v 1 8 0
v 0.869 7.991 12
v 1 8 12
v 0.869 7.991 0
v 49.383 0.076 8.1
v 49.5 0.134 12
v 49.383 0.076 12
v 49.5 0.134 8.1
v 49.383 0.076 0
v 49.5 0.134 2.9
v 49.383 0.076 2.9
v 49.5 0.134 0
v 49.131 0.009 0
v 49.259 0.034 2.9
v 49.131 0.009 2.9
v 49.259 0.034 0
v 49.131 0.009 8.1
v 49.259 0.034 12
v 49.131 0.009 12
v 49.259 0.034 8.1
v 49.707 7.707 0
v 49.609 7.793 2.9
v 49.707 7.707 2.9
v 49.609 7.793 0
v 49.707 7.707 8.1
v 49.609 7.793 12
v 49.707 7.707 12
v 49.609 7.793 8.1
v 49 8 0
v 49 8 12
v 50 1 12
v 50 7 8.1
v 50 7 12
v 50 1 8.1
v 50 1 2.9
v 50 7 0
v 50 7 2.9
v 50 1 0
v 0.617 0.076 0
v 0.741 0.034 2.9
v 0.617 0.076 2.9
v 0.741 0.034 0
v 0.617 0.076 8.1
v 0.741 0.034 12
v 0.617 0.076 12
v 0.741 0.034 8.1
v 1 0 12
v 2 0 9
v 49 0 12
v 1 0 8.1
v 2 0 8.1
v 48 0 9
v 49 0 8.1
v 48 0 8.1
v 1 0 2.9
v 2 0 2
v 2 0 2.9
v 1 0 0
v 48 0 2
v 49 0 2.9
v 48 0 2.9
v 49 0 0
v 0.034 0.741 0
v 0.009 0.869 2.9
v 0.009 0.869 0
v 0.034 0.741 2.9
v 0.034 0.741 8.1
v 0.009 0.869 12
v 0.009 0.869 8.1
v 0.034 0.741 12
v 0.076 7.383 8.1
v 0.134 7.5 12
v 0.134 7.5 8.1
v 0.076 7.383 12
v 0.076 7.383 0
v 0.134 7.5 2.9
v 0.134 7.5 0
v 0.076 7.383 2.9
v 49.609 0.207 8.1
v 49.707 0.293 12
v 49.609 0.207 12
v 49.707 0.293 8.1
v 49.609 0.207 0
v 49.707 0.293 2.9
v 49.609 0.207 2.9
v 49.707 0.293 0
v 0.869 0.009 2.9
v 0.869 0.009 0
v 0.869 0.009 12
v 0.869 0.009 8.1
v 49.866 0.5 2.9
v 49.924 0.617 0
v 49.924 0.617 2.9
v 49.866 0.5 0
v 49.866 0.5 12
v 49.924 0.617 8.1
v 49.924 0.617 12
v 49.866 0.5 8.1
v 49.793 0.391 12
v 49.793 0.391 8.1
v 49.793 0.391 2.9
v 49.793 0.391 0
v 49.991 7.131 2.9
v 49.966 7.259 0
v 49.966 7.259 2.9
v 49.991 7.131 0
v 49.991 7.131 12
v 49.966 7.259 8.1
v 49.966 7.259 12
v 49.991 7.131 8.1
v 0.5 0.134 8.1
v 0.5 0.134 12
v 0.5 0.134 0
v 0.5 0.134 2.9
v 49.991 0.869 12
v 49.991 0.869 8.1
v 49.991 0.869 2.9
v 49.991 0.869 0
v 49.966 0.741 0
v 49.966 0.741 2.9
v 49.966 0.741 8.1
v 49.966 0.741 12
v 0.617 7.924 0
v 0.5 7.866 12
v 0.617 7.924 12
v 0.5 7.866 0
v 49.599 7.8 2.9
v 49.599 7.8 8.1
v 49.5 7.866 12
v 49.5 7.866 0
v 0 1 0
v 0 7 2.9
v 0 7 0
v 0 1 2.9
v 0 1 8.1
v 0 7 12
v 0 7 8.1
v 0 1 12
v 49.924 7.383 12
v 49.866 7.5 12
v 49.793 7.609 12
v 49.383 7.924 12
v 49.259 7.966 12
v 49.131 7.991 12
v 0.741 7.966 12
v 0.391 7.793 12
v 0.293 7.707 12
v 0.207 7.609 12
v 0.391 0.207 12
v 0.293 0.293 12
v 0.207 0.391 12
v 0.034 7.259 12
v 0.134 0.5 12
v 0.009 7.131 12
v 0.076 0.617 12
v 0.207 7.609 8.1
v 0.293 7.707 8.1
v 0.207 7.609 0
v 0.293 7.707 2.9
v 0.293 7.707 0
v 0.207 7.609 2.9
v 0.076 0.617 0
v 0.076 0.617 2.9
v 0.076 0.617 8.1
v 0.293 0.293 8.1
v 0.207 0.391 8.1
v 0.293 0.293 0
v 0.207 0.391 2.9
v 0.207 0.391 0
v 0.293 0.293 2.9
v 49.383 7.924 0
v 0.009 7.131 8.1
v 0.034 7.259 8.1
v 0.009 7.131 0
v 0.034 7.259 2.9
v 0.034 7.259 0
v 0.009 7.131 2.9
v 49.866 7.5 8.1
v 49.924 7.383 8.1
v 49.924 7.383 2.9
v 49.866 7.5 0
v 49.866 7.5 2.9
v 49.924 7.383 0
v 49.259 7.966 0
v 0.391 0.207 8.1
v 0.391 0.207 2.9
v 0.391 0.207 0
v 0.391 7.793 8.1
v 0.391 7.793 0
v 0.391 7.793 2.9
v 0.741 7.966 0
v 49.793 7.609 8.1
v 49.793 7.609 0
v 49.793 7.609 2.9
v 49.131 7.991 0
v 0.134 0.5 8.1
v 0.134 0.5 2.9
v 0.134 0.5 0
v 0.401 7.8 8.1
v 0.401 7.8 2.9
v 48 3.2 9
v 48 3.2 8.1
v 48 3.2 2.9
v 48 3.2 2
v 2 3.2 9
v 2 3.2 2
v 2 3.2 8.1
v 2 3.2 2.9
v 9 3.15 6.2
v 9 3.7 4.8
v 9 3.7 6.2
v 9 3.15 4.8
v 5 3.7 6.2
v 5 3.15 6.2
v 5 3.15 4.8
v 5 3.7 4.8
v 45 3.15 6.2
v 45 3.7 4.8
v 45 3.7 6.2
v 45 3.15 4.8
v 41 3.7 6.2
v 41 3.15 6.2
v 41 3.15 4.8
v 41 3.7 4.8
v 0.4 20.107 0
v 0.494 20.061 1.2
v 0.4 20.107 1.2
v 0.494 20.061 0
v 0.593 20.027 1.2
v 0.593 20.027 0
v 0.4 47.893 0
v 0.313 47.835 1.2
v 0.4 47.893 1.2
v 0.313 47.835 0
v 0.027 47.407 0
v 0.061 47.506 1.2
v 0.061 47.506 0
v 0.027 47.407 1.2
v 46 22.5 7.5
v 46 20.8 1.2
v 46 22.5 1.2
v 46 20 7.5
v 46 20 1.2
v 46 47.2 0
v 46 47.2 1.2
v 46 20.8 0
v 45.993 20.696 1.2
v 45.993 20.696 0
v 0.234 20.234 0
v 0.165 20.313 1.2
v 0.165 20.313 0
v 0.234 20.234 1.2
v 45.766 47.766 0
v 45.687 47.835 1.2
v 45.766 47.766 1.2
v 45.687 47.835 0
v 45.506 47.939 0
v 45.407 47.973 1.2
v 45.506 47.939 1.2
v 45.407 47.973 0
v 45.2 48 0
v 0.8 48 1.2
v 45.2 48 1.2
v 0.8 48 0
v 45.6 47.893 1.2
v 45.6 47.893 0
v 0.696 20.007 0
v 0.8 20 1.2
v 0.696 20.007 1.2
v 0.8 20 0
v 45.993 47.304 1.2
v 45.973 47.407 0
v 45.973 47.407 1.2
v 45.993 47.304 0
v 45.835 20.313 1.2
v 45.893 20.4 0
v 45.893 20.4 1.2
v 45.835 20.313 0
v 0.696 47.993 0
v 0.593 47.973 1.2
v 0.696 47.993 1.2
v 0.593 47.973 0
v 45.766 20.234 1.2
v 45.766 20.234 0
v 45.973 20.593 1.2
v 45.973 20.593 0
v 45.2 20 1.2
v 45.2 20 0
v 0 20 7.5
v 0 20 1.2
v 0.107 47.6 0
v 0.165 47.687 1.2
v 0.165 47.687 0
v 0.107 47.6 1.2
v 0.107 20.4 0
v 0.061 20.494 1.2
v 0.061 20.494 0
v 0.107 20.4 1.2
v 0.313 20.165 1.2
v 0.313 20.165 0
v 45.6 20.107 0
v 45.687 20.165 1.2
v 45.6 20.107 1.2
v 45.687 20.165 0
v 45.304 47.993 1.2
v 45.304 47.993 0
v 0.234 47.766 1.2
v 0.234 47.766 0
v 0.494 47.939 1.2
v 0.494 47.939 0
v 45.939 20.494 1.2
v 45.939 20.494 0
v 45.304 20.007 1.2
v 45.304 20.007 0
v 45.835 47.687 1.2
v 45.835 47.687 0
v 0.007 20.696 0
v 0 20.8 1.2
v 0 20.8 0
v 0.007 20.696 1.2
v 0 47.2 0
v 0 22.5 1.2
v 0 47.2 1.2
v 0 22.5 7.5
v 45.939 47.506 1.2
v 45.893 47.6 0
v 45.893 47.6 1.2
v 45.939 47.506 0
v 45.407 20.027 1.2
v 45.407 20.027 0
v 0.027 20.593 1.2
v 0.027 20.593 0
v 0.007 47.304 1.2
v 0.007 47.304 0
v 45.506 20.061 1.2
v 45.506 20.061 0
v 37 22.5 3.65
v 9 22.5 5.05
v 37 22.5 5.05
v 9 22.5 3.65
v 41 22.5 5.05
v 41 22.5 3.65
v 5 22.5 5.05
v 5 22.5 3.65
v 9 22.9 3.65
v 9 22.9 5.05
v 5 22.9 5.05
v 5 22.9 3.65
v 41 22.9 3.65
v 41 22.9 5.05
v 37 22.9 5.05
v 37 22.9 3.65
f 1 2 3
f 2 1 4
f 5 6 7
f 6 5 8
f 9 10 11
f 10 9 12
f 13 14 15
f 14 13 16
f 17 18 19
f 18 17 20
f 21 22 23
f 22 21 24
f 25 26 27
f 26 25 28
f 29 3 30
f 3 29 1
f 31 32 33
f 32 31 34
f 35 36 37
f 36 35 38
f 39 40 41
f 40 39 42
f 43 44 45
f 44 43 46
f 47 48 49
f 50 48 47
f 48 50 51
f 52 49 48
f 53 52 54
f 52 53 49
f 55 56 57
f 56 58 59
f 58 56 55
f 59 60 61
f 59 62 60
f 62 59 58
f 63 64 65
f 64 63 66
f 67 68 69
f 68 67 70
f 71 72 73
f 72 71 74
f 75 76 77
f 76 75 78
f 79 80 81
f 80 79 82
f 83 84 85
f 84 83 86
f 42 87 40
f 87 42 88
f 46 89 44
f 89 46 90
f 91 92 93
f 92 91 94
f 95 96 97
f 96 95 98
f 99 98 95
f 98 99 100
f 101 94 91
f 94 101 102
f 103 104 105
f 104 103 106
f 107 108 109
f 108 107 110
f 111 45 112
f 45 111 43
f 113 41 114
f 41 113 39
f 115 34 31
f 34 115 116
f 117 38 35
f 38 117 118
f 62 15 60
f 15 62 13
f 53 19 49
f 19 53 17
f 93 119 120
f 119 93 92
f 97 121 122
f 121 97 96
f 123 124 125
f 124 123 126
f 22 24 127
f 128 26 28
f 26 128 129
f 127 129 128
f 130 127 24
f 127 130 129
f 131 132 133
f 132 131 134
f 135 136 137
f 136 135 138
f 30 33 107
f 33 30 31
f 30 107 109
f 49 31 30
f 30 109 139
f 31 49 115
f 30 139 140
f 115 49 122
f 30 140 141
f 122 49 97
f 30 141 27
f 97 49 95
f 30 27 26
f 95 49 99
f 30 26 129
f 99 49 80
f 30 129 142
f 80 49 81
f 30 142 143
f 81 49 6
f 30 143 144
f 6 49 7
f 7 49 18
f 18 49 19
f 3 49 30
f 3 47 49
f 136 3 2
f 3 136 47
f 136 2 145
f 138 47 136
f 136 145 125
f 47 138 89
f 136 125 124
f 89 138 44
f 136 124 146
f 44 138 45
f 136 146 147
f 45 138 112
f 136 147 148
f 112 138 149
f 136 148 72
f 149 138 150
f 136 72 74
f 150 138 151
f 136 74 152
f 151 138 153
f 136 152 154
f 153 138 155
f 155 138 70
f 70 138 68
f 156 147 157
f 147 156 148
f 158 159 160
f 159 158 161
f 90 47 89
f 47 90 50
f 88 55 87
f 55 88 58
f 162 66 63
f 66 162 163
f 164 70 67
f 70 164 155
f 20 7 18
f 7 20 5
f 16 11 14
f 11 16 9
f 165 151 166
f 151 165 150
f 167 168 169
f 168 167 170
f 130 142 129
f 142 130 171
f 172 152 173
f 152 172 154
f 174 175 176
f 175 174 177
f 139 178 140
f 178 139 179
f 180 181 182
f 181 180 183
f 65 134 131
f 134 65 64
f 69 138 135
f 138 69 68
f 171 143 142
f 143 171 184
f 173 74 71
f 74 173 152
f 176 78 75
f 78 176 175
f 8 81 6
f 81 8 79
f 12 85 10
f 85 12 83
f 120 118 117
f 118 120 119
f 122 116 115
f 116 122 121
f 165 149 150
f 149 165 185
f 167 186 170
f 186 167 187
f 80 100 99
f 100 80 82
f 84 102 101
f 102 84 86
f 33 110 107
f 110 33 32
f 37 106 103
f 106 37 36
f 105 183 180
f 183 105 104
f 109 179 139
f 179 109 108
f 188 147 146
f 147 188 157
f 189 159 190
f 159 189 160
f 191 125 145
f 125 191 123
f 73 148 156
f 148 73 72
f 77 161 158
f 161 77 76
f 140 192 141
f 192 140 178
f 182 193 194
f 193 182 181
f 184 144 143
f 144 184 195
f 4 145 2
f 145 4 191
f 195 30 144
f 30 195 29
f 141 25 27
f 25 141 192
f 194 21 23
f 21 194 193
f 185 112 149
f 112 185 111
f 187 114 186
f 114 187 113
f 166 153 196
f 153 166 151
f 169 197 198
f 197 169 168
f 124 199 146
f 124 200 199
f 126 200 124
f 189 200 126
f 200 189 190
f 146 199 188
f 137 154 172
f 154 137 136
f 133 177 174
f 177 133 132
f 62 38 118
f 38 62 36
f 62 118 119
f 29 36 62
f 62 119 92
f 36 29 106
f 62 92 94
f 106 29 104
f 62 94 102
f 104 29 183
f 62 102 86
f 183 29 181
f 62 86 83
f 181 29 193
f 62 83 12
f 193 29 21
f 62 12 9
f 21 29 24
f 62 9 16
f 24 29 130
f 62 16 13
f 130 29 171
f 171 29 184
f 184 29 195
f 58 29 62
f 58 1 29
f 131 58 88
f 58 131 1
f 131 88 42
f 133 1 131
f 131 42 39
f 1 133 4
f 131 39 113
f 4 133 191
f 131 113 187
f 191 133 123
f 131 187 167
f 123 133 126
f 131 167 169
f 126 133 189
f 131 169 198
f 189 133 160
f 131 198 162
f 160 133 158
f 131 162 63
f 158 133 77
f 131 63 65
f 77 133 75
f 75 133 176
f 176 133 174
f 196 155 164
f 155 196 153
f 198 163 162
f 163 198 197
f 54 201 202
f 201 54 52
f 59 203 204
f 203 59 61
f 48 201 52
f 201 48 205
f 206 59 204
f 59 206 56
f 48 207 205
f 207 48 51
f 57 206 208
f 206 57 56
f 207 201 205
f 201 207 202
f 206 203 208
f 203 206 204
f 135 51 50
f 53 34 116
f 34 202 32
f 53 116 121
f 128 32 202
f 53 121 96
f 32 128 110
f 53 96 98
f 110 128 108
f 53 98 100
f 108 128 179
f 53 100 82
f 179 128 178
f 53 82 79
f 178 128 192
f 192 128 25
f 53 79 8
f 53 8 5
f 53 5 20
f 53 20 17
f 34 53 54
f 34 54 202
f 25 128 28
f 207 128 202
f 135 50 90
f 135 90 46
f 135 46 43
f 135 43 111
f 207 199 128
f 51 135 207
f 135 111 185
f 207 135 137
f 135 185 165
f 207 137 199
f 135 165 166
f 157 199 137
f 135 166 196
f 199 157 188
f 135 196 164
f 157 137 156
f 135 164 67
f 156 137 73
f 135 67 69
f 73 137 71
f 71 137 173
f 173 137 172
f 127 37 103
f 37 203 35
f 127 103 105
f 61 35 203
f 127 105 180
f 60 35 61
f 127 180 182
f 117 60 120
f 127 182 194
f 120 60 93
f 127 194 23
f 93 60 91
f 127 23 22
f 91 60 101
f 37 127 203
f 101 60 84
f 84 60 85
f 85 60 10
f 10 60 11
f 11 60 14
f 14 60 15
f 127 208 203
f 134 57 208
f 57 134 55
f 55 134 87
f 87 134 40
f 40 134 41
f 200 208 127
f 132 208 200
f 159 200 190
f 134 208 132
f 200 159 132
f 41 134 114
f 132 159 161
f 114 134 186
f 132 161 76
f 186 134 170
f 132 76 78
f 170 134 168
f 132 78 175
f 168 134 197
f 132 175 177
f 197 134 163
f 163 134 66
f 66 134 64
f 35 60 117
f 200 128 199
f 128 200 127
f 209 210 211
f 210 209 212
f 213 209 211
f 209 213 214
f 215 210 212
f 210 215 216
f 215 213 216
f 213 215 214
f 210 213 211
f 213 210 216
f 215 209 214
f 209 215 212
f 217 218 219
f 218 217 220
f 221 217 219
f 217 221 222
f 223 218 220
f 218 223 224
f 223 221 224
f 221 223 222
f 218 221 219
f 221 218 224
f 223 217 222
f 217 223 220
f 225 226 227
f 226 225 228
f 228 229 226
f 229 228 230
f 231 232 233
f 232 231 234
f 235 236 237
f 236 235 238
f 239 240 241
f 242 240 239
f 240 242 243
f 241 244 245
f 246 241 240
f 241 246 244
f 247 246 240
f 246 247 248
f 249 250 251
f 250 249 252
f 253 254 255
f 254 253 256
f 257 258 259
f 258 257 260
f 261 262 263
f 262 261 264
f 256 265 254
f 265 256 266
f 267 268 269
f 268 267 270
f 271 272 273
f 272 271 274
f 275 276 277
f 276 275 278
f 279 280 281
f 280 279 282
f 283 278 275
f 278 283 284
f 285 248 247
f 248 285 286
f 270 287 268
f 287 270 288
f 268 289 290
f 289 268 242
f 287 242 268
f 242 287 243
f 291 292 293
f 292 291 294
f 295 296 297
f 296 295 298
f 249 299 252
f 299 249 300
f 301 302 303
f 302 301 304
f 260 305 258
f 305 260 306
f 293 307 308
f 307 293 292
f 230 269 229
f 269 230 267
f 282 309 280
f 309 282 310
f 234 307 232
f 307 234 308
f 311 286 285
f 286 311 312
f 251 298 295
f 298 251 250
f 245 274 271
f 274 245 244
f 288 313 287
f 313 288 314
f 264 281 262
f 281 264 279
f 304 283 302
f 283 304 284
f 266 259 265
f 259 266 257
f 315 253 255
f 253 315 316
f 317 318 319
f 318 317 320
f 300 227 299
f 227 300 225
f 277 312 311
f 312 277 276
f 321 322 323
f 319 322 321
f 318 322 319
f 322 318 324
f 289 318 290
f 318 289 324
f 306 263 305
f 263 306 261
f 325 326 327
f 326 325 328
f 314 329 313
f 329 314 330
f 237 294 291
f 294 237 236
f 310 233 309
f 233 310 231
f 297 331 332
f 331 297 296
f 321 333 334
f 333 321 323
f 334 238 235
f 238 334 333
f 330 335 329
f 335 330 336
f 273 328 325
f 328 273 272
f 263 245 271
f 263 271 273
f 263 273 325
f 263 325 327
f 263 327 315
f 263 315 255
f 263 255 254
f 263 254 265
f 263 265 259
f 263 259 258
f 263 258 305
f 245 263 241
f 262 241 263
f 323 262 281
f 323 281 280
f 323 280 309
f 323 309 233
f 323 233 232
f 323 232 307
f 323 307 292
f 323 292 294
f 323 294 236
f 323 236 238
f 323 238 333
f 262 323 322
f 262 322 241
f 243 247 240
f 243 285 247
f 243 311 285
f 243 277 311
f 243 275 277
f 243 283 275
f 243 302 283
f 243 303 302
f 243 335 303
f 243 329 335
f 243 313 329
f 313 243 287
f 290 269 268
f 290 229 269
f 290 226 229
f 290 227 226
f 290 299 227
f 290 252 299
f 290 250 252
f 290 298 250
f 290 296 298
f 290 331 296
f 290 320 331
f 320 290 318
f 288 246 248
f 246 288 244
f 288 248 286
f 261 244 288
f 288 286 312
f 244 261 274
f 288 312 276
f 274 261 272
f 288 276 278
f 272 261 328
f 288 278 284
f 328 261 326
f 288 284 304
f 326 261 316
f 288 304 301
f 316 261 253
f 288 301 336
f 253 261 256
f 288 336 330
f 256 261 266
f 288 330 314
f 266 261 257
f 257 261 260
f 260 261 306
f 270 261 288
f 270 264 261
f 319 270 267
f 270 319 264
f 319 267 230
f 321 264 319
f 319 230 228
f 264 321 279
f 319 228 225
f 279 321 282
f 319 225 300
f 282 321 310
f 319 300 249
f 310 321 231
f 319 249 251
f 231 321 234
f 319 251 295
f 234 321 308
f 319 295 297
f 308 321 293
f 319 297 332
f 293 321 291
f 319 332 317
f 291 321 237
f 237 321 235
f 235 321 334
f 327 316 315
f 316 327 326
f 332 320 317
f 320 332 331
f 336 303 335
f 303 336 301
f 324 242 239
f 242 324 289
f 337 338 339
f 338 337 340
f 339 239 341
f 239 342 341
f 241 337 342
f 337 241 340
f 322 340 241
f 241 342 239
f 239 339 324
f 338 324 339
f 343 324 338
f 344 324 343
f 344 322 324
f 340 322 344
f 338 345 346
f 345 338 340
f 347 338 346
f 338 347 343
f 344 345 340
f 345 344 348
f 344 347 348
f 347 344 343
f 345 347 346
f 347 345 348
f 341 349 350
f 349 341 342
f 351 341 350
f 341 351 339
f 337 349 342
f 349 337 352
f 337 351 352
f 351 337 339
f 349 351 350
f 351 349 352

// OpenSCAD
/*
Small-scale snap-fit binder + page experiment.

Concept:
  - The binder is a short rail with a C-shaped side groove.
  - The page is a thin strip with a spine bead that slides into the groove.
  - Small top/bottom detents on the page bead create removable locking.

Part selector:
  part_id = 0; // preview both parts
  part_id = 1; // binder rail
  part_id = 2; // page strip
*/

$fn = 48;

part_id = 0;

clearance = 0.35;
rail_length = 50;
rail_height = 12;
rail_depth = 8;
wall = 2.0;

groove_width = 3.2;
groove_height = 7.0;
lip = 0.9;

page_length = 46;
page_width = 28;
page_thickness = 1.2;
spine_width = groove_width - 2 * clearance;
spine_height = groove_height - 2 * clearance;
detent_height = 0.45;
detent_length = 4.0;

module rounded_plate(size, r = 0.9) {
    hull() {
        for (x = [r, size[0] - r])
        for (y = [r, size[1] - r])
            translate([x, y, 0]) cylinder(h = size[2], r = r);
    }
}

module binder() {
    difference() {
        rounded_plate([rail_length, rail_depth, rail_height], 1.0);

        // Main channel.
        translate([wall, -0.1, wall])
            cube([rail_length - 2 * wall, groove_width + 0.1, groove_height]);

        // Front slot, leaving top/bottom lips to capture the page spine.
        translate([wall, -0.2, wall + lip])
            cube([rail_length - 2 * wall, rail_depth, groove_height - 2 * lip]);

        // Entry chamfers at both ends so the page starts more easily.
        translate([-0.1, -0.2, wall + lip])
            cube([2.2, rail_depth, groove_height - 2 * lip]);
        translate([rail_length - 2.1, -0.2, wall + lip])
            cube([2.2, rail_depth, groove_height - 2 * lip]);
    }

    // End-stop bumps inside the rail; these are intentionally small.
    translate([5, groove_width - 0.05, wall + groove_height / 2 - 0.7])
        cube([detent_length, 0.55, 1.4]);
    translate([rail_length - 5 - detent_length, groove_width - 0.05, wall + groove_height / 2 - 0.7])
        cube([detent_length, 0.55, 1.4]);
}

module page() {
    // A tiny page, printed flat, with a thicker snap spine on the left edge.
    rounded_plate([page_length, page_width, page_thickness], 0.8);

    translate([0, 0, page_thickness])
        cube([page_length, spine_width, spine_height]);

    // Removable lock bumps. If this is too tight, reduce detent_height first.
    translate([5, spine_width - 0.05, page_thickness + spine_height / 2 - 0.7])
        cube([detent_length, detent_height, 1.4]);
    translate([page_length - 5 - detent_length, spine_width - 0.05, page_thickness + spine_height / 2 - 0.7])
        cube([detent_length, detent_height, 1.4]);
}

module both_preview() {
    binder();
    translate([0, 20, 0]) page();
}

if (part_id == 1) {
    binder();
} else if (part_id == 2) {
    page();
} else {
    both_preview();
}
